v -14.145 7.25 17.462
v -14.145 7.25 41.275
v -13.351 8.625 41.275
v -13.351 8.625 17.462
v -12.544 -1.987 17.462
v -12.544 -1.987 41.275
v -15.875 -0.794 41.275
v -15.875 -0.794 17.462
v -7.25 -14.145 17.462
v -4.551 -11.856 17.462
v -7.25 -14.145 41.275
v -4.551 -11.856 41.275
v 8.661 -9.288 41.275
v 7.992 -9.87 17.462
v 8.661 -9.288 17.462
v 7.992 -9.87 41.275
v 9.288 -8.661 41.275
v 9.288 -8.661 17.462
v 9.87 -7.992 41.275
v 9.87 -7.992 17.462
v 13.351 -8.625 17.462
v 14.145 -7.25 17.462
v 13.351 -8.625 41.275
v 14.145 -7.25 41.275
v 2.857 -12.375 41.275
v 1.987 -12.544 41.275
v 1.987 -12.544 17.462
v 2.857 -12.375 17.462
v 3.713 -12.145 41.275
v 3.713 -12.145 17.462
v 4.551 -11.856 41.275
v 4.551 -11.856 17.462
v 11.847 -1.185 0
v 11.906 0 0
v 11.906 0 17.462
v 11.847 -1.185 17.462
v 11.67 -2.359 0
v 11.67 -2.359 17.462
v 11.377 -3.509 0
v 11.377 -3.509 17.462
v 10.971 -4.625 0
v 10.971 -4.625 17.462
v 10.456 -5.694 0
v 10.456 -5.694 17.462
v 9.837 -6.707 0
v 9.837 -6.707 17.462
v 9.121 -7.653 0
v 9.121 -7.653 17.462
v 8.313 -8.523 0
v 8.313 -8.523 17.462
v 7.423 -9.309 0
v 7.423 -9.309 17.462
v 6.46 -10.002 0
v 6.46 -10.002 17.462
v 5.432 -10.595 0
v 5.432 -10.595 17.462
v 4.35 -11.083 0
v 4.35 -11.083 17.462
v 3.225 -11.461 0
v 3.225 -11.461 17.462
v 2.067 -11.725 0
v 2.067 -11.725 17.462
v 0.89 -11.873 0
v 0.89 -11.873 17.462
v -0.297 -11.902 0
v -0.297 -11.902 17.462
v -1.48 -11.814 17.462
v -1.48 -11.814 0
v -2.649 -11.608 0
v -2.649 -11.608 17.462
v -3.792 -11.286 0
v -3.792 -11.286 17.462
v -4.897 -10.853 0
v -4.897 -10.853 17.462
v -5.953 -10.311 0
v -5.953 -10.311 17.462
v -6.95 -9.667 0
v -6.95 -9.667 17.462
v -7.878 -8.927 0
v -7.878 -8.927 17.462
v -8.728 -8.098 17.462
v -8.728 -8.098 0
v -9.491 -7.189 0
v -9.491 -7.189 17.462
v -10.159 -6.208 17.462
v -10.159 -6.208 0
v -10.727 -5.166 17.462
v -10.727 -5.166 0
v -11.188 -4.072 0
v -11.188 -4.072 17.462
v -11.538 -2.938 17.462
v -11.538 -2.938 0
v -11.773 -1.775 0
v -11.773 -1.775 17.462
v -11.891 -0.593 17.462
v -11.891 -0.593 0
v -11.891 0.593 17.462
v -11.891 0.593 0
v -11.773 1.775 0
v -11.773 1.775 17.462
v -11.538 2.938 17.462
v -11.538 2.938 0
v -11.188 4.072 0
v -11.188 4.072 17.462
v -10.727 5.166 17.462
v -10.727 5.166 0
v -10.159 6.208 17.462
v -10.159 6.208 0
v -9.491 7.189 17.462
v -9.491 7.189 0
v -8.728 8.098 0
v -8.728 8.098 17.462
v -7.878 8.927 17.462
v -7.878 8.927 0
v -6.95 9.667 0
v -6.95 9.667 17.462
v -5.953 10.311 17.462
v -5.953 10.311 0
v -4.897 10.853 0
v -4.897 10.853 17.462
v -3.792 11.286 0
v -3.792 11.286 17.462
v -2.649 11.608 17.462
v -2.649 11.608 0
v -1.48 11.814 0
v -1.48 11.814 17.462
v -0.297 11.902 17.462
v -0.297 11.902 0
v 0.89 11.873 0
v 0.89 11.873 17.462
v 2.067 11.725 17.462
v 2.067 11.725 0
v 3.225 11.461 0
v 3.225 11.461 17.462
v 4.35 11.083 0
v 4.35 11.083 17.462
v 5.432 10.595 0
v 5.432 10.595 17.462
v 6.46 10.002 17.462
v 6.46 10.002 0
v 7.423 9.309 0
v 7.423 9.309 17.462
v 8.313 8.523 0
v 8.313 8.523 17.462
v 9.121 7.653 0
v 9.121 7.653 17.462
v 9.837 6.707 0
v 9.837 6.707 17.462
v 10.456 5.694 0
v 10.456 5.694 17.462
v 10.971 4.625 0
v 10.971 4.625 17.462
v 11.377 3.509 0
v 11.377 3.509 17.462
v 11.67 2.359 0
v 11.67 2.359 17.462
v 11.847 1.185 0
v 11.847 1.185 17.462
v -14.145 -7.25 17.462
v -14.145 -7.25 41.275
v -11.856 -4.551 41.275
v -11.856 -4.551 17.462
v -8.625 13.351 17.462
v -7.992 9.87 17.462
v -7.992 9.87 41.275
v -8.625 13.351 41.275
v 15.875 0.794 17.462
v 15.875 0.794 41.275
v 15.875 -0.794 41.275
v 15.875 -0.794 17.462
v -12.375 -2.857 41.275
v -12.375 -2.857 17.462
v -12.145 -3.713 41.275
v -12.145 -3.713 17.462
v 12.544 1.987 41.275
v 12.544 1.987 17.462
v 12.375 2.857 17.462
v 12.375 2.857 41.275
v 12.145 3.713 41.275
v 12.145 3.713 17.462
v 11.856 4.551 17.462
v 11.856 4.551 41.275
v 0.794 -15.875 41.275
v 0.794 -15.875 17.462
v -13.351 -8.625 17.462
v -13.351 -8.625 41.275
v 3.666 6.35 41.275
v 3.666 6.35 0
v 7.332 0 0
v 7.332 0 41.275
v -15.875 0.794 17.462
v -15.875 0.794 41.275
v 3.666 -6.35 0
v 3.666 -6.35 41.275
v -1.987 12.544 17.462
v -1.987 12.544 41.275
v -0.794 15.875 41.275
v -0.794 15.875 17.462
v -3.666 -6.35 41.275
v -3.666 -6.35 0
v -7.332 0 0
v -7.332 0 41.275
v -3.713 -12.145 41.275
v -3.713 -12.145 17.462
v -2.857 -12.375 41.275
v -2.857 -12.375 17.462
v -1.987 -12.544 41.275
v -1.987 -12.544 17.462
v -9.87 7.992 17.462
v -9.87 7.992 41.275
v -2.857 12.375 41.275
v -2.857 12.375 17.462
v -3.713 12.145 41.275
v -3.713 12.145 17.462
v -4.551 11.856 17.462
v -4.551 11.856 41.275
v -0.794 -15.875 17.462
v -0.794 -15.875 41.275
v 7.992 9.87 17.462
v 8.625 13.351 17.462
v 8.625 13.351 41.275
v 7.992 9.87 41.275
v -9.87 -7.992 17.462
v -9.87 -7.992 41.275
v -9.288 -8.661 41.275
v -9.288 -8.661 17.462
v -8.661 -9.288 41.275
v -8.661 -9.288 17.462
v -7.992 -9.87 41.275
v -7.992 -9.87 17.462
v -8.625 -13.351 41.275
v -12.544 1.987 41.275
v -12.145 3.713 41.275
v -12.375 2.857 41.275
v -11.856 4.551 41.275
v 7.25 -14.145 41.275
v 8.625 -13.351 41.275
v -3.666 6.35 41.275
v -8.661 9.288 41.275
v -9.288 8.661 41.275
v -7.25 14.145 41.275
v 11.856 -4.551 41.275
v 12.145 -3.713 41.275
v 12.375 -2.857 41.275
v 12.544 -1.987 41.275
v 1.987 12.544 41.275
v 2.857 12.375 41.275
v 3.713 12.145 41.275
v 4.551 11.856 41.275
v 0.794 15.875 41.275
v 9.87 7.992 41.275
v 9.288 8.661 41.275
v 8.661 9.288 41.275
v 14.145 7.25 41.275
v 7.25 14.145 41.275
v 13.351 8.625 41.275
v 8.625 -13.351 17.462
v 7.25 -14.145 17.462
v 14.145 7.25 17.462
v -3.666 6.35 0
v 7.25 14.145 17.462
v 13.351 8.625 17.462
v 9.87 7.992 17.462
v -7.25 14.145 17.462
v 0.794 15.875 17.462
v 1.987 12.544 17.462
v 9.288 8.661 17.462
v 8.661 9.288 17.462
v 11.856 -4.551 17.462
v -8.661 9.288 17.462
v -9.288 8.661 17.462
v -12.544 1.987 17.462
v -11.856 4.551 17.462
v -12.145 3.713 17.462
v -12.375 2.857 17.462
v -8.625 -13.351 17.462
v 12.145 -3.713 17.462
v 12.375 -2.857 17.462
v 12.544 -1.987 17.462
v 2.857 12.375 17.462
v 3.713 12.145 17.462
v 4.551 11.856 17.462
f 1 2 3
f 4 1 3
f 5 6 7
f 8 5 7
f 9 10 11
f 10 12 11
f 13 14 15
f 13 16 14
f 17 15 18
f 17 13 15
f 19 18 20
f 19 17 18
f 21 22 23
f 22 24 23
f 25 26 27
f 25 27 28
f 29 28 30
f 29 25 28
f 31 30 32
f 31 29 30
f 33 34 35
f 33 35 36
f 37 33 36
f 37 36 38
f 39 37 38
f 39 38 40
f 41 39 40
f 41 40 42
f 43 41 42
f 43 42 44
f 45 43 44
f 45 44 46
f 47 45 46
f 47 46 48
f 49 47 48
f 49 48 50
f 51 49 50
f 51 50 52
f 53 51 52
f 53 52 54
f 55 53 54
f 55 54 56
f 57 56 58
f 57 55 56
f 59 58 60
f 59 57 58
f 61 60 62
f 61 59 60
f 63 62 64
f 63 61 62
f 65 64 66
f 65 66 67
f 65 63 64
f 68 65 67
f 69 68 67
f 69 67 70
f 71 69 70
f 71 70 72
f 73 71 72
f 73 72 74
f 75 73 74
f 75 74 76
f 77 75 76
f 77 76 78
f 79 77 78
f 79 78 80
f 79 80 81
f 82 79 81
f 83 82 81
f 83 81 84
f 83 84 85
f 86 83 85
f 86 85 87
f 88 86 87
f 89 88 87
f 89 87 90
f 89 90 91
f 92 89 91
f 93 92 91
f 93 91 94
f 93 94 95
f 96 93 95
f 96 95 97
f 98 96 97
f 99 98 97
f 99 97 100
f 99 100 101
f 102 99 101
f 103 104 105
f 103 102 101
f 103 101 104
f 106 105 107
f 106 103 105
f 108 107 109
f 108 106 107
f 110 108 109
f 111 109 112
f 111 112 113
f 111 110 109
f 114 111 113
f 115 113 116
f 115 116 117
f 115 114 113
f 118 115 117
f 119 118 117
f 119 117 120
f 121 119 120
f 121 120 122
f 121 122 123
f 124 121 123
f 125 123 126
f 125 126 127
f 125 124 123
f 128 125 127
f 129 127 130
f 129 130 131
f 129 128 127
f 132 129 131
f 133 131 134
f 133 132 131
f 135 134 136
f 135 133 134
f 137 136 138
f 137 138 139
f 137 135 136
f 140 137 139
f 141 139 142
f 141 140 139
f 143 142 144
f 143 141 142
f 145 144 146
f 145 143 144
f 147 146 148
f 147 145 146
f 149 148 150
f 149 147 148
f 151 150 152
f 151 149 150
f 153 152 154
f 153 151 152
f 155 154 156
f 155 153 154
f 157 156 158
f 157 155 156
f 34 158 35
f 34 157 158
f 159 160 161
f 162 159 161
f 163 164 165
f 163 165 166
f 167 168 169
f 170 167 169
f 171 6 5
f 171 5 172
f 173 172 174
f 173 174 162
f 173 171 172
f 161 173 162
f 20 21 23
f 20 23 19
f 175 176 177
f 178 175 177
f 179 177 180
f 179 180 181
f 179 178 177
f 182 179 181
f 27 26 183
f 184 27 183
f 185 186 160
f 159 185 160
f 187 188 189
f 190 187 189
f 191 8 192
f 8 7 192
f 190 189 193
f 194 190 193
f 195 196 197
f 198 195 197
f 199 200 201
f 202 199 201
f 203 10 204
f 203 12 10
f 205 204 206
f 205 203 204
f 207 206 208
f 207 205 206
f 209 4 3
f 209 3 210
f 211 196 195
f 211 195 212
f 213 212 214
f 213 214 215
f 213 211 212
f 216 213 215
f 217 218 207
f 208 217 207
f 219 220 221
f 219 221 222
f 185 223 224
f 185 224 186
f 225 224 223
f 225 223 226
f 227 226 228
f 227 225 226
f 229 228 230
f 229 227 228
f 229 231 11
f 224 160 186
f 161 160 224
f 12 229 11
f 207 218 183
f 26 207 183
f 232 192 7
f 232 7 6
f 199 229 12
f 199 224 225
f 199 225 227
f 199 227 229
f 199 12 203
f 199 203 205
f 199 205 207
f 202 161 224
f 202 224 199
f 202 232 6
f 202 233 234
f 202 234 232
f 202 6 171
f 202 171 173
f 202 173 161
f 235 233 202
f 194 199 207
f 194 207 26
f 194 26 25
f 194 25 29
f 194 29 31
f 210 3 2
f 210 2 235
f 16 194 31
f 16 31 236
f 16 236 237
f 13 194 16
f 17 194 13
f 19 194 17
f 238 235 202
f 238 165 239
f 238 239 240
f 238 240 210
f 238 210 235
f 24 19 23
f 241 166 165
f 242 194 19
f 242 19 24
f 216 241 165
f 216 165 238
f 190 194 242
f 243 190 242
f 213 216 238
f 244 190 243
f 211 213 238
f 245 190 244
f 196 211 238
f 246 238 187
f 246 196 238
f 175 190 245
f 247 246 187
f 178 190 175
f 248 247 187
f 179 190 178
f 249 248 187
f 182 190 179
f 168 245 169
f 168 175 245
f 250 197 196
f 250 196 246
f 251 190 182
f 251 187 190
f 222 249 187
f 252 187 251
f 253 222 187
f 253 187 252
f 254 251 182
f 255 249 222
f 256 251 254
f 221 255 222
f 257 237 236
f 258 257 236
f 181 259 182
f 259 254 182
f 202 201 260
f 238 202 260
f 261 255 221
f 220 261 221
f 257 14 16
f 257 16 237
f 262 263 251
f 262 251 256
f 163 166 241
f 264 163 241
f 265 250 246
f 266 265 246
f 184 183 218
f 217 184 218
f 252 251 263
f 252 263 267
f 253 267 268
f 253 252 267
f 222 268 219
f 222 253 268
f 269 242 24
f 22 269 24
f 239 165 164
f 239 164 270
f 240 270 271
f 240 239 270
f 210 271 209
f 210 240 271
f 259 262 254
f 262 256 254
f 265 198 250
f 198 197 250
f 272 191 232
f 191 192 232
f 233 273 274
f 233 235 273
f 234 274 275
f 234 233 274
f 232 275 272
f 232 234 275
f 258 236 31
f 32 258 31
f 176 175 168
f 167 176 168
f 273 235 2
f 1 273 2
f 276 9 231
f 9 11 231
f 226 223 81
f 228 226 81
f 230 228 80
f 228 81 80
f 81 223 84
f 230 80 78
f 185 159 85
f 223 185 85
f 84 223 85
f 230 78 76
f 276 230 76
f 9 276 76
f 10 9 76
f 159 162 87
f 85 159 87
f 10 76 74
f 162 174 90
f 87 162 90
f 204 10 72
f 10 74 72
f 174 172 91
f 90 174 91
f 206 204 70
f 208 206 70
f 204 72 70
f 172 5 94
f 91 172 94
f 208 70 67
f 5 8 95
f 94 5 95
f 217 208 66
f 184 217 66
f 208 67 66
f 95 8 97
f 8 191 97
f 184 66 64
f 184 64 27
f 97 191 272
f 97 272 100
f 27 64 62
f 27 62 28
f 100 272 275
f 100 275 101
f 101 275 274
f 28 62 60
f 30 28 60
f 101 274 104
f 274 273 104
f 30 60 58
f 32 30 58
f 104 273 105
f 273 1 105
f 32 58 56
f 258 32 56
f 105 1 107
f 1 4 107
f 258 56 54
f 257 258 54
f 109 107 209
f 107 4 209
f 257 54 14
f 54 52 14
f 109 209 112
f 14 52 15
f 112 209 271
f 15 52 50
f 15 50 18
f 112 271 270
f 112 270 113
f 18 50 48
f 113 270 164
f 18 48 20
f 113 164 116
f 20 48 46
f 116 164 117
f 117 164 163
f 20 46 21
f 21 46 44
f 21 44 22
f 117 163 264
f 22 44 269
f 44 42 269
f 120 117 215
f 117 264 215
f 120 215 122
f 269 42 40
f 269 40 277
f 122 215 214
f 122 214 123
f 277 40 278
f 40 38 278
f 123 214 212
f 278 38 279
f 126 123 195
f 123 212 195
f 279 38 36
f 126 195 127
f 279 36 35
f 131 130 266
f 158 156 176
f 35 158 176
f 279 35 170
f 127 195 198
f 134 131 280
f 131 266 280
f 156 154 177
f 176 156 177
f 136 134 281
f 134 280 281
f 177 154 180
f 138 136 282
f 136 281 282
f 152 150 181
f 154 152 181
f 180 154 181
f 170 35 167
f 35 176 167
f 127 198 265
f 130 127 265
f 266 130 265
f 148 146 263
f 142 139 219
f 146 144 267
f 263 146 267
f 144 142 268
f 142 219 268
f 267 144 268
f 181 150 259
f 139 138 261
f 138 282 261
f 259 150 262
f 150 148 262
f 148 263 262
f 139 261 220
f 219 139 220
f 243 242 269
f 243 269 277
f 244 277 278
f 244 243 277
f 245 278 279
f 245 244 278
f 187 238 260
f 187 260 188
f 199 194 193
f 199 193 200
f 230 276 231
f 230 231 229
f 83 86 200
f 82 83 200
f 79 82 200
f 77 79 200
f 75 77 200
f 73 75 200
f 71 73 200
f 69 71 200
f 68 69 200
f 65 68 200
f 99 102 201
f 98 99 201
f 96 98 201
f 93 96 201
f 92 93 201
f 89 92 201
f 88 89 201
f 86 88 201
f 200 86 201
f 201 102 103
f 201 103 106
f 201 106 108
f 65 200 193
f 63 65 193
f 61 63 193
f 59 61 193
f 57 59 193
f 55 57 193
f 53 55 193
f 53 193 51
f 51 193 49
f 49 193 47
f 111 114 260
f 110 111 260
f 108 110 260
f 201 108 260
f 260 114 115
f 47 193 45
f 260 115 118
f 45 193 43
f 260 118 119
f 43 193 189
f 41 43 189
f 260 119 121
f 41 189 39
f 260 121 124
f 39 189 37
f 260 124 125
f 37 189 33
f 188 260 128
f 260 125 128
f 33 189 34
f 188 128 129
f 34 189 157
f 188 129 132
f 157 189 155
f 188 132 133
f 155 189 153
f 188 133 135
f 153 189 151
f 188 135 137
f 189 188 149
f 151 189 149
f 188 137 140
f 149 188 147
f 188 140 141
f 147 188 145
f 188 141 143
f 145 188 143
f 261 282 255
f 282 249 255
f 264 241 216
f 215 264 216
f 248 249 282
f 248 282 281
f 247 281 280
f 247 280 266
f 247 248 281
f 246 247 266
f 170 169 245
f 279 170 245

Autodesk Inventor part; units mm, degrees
ref_plane "YZ Plane" through (0, 0, 0) normal (1, 0, 0) x (0, 1, 0)
ref_plane "XZ Plane" through (0, 0, 0) normal (0, 1, 0) x (-1, 0, 0)
ref_plane "XY Plane" through (0, 0, 0) normal (0, 0, 1) x (1, 0, 0)
sketch "Sketch1" plane through (0, 0, 0) normal (0, 0, 1) x (1, 0, 0)
  circle A0 centre (0, 0) radius 11.9062
  dimension "d0" = 23.8125
extrude "Extrusion1" add sketch "Sketch1" along normal blind 41.275
sketch "Sketch2" plane through (0, 0, 41.275) normal (0, 0, 1) x (1, 0, 0)
  circle A0 centre (0, 0) radius 12.7
  dimension "d3" = 25.4
extrude "Extrusion2" add sketch "Sketch2" against normal blind 23.8125
sketch "Sketch3" plane through (0, 0, 41.275) normal (0, 0, 1) x (1, 0, 0)
  line L0 (-3.6662, 6.35) -> (3.6662, 6.35)
  line L1 (3.6662, 6.35) -> (7.3323, 0)
  line L2 (7.3323, 0) -> (3.6662, -6.35)
  line L3 (3.6662, -6.35) -> (-3.6662, -6.35)
  line L4 (-3.6662, -6.35) -> (-7.3323, 0)
  line L5 (-7.3323, 0) -> (-3.6662, 6.35)
  point P0 (0, 0)
  dimension "d6" = 12.7
  dimension "d7" = 12.7
  dimension "d8" = 12.7
  dimension "d9" = 120
  dimension "d10" = 120
  dimension "d11" = 6.35
  dimension "d12" = 6.35
  dimension "d13" = 6.35
extrude "Extrusion3" cut sketch "Sketch3" against normal blind 50.8
sketch "Sketch4" plane through (0, 0, 41.275) normal (0, 0, 1) x (1, 0, 0)
  line L0 (-7.3323, 0) -> (-3.6662, 6.35) projected
  line L1 (-3.6662, 6.35) -> (3.6662, 6.35) projected
  line L2 (3.6662, 6.35) -> (7.3323, 0) projected
  line L3 (7.3323, 0) -> (3.6662, -6.35) projected
  line L4 (3.6662, -6.35) -> (-3.6662, -6.35) projected
  line L5 (-3.6662, -6.35) -> (-7.3323, 0) projected
  circle A0 centre (0, 0) radius 12.7 projected
  line L6 (0, 12.7) -> (0, 15.875) construction
  line L7 (0, 12.7) -> (3.175, 12.7) construction
  line L8 (0, 0) -> (1.9867, 12.5436) construction
  circle A1 centre (0, 0) radius 12.7 construction
  line L9 (0, 0) -> (12.7, 0) construction
  line L10 (0, 0) -> (-1.9867, 12.5436) construction
  line L11 (0, 0) -> (12.7, 0) construction
  line L12 (0, 15.875) -> (0.7937, 15.875) construction
  line L13 (0, 15.875) -> (0.7937, 15.875) construction
  line L14 (0, 15.875) -> (-0.7937, 15.875) construction
  line L15 (0, 15.875) -> (0.7937, 15.875) construction
  line L16 (-1.9867, 12.5436) -> (-0.7937, 15.875)
  line L17 (-0.7937, 15.875) -> (0.7937, 15.875)
  line L18 (0.7937, 15.875) -> (1.9867, 12.5436)
  line L19 (-1.9867, 12.5436) -> (1.9867, 12.5436)
  line L20 (-6.35, 10.9985) -> (-7.9375, 13.7482) construction
  line L21 (-6.35, 10.9985) -> (-3.6004, 12.586) construction
  line L22 (0, 0) -> (-4.5513, 11.8565) construction
  line L23 (0, 0) -> (-7.9924, 9.8698) construction
  line L24 (-7.9375, 13.7482) -> (-7.2501, 14.145) construction
  line L25 (-7.9375, 13.7482) -> (-7.2501, 14.145) construction
  line L26 (-7.9375, 13.7482) -> (-8.6249, 13.3513) construction
  line L27 (-7.9375, 13.7482) -> (-7.2501, 14.145) construction
  line L28 (-7.9924, 9.8698) -> (-8.6249, 13.3513)
  line L29 (-8.6249, 13.3513) -> (-7.2501, 14.145)
  line L30 (-7.2501, 14.145) -> (-4.5513, 11.8565)
  line L31 (-7.9924, 9.8698) -> (-4.5513, 11.8565)
  line L32 (-10.9985, 6.35) -> (-13.7482, 7.9375) construction
  line L33 (-10.9985, 6.35) -> (-9.411, 9.0996) construction
  line L34 (0, 0) -> (-9.8698, 7.9924) construction
  line L35 (0, 0) -> (-11.8565, 4.5513) construction
  line L36 (-13.7482, 7.9375) -> (-13.3513, 8.6249) construction
  line L37 (-13.7482, 7.9375) -> (-13.3513, 8.6249) construction
  line L38 (-13.7482, 7.9375) -> (-14.145, 7.2501) construction
  line L39 (-13.7482, 7.9375) -> (-13.3513, 8.6249) construction
  line L40 (-11.8565, 4.5513) -> (-14.145, 7.2501)
  line L41 (-14.145, 7.2501) -> (-13.3513, 8.6249)
  line L42 (-13.3513, 8.6249) -> (-9.8698, 7.9924)
  line L43 (-11.8565, 4.5513) -> (-9.8698, 7.9924)
  line L44 (-12.7, 0) -> (-15.875, 0) construction
  line L45 (-12.7, 0) -> (-12.7, 3.175) construction
  line L46 (0, 0) -> (-12.5436, 1.9867) construction
  line L47 (0, 0) -> (-12.5436, -1.9867) construction
  line L48 (-15.875, 0) -> (-15.875, 0.7938) construction
  line L49 (-15.875, 0) -> (-15.875, 0.7938) construction
  line L50 (-15.875, 0) -> (-15.875, -0.7937) construction
  line L51 (-15.875, 0) -> (-15.875, 0.7938) construction
  line L52 (-12.5436, -1.9867) -> (-15.875, -0.7937)
  line L53 (-15.875, -0.7937) -> (-15.875, 0.7938)
  line L54 (-15.875, 0.7938) -> (-12.5436, 1.9867)
  line L55 (-12.5436, -1.9867) -> (-12.5436, 1.9867)
  line L56 (-10.9985, -6.35) -> (-13.7482, -7.9375) construction
  line L57 (-10.9985, -6.35) -> (-12.586, -3.6004) construction
  line L58 (0, 0) -> (-11.8565, -4.5513) construction
  line L59 (0, 0) -> (-9.8698, -7.9924) construction
  line L60 (-13.7482, -7.9375) -> (-14.145, -7.2501) construction
  line L61 (-13.7482, -7.9375) -> (-14.145, -7.2501) construction
  line L62 (-13.7482, -7.9375) -> (-13.3513, -8.6249) construction
  line L63 (-13.7482, -7.9375) -> (-14.145, -7.2501) construction
  line L64 (-9.8698, -7.9924) -> (-13.3513, -8.6249)
  line L65 (-13.3513, -8.6249) -> (-14.145, -7.2501)
  line L66 (-14.145, -7.2501) -> (-11.8565, -4.5513)
  line L67 (-9.8698, -7.9924) -> (-11.8565, -4.5513)
  line L68 (-6.35, -10.9985) -> (-7.9375, -13.7482) construction
  line L69 (-6.35, -10.9985) -> (-9.0996, -9.411) construction
  line L70 (0, 0) -> (-7.9924, -9.8698) construction
  line L71 (0, 0) -> (-4.5513, -11.8565) construction
  line L72 (-7.9375, -13.7482) -> (-8.6249, -13.3513) construction
  line L73 (-7.9375, -13.7482) -> (-8.6249, -13.3513) construction
  line L74 (-7.9375, -13.7482) -> (-7.2501, -14.145) construction
  line L75 (-7.9375, -13.7482) -> (-8.6249, -13.3513) construction
  line L76 (-4.5513, -11.8565) -> (-7.2501, -14.145)
  line L77 (-7.2501, -14.145) -> (-8.6249, -13.3513)
  line L78 (-8.6249, -13.3513) -> (-7.9924, -9.8698)
  line L79 (-4.5513, -11.8565) -> (-7.9924, -9.8698)
  line L80 (0, -12.7) -> (0, -15.875) construction
  line L81 (0, -12.7) -> (-3.175, -12.7) construction
  line L82 (0, 0) -> (-1.9867, -12.5436) construction
  line L83 (0, 0) -> (1.9867, -12.5436) construction
  line L84 (0, -15.875) -> (-0.7938, -15.875) construction
  line L85 (0, -15.875) -> (-0.7938, -15.875) construction
  line L86 (0, -15.875) -> (0.7937, -15.875) construction
  line L87 (0, -15.875) -> (-0.7938, -15.875) construction
  line L88 (1.9867, -12.5436) -> (0.7937, -15.875)
  line L89 (0.7937, -15.875) -> (-0.7938, -15.875)
  line L90 (-0.7938, -15.875) -> (-1.9867, -12.5436)
  line L91 (1.9867, -12.5436) -> (-1.9867, -12.5436)
  line L92 (6.35, -10.9985) -> (7.9375, -13.7482) construction
  line L93 (6.35, -10.9985) -> (3.6004, -12.586) construction
  line L94 (0, 0) -> (4.5513, -11.8565) construction
  line L95 (0, 0) -> (7.9924, -9.8698) construction
  line L96 (7.9375, -13.7482) -> (7.2501, -14.145) construction
  line L97 (7.9375, -13.7482) -> (7.2501, -14.145) construction
  line L98 (7.9375, -13.7482) -> (8.6249, -13.3513) construction
  line L99 (7.9375, -13.7482) -> (7.2501, -14.145) construction
  line L100 (7.9924, -9.8698) -> (8.6249, -13.3513)
  line L101 (8.6249, -13.3513) -> (7.2501, -14.145)
  line L102 (7.2501, -14.145) -> (4.5513, -11.8565)
  line L103 (7.9924, -9.8698) -> (4.5513, -11.8565)
  line L104 (10.9985, -6.35) -> (13.7482, -7.9375) construction
  line L105 (10.9985, -6.35) -> (9.411, -9.0996) construction
  line L106 (0, 0) -> (9.8698, -7.9924) construction
  line L107 (0, 0) -> (11.8565, -4.5513) construction
  line L108 (13.7482, -7.9375) -> (13.3513, -8.6249) construction
  line L109 (13.7482, -7.9375) -> (13.3513, -8.6249) construction
  line L110 (13.7482, -7.9375) -> (14.145, -7.2501) construction
  line L111 (13.7482, -7.9375) -> (13.3513, -8.6249) construction
  line L112 (11.8565, -4.5513) -> (14.145, -7.2501)
  line L113 (14.145, -7.2501) -> (13.3513, -8.6249)
  line L114 (13.3513, -8.6249) -> (9.8698, -7.9924)
  line L115 (11.8565, -4.5513) -> (9.8698, -7.9924)
  line L116 (12.7, 0) -> (15.875, 0) construction
  line L117 (12.7, 0) -> (12.7, -3.175) construction
  line L118 (0, 0) -> (12.5436, -1.9867) construction
  line L119 (0, 0) -> (12.5436, 1.9867) construction
  line L120 (15.875, 0) -> (15.875, -0.7938) construction
  line L121 (15.875, 0) -> (15.875, -0.7938) construction
  line L122 (15.875, 0) -> (15.875, 0.7937) construction
  line L123 (15.875, 0) -> (15.875, -0.7938) construction
  line L124 (12.5436, 1.9867) -> (15.875, 0.7937)
  line L125 (15.875, 0.7937) -> (15.875, -0.7938)
  line L126 (15.875, -0.7938) -> (12.5436, -1.9867)
  line L127 (12.5436, 1.9867) -> (12.5436, -1.9867)
  line L128 (10.9985, 6.35) -> (13.7482, 7.9375) construction
  line L129 (10.9985, 6.35) -> (12.586, 3.6004) construction
  line L130 (0, 0) -> (11.8565, 4.5513) construction
  line L131 (0, 0) -> (9.8698, 7.9924) construction
  line L132 (13.7482, 7.9375) -> (14.145, 7.2501) construction
  line L133 (13.7482, 7.9375) -> (14.145, 7.2501) construction
  line L134 (13.7482, 7.9375) -> (13.3513, 8.6249) construction
  line L135 (13.7482, 7.9375) -> (14.145, 7.2501) construction
  line L136 (9.8698, 7.9924) -> (13.3513, 8.6249)
  line L137 (13.3513, 8.6249) -> (14.145, 7.2501)
  line L138 (14.145, 7.2501) -> (11.8565, 4.5513)
  line L139 (9.8698, 7.9924) -> (11.8565, 4.5513)
  line L140 (6.35, 10.9985) -> (7.9375, 13.7482) construction
  line L141 (6.35, 10.9985) -> (9.0996, 9.411) construction
  line L142 (0, 0) -> (7.9924, 9.8698) construction
  line L143 (0, 0) -> (4.5513, 11.8565) construction
  line L144 (7.9375, 13.7482) -> (8.6249, 13.3513) construction
  line L145 (7.9375, 13.7482) -> (8.6249, 13.3513) construction
  line L146 (7.9375, 13.7482) -> (7.2501, 14.145) construction
  line L147 (7.9375, 13.7482) -> (8.6249, 13.3513) construction
  line L148 (4.5513, 11.8565) -> (7.2501, 14.145)
  line L149 (7.2501, 14.145) -> (8.6249, 13.3513)
  line L150 (8.6249, 13.3513) -> (7.9924, 9.8698)
  line L151 (4.5513, 11.8565) -> (7.9924, 9.8698)
  dimension "d16" = 12.7
  dimension "d17" = 0
  dimension "d18" = 3.175
  dimension "d19" = 90
  dimension "d20" = 81
  dimension "d21" = 99
  dimension "d22" = 0.7937
  dimension "d23" = 0
  dimension "d24" = 0.7937
  dimension "d25" = 180
  dimension "d28" = 360
extrude "Extrusion4" add sketch "Sketch4" against normal blind 23.8125 contours A0 L127 | A0 L124 L125 L126 | L139 A0 | A0 L136 L137 L138 | L112 L113 L114 A0 | A0 L115 | L151 A0 | A0 L148 L149 L150 | L100 L101 L102 A0 | A0 L103 | L19 A0 | A0 L16 L17 L18 | L88 L89 L90 A0 | A0 L91 | L31 A0 | A0 L28 L29 L30 | L76 L77 L78 A0 | A0 L79 | L43 A0 | A0 L40 L41 L42 | L64 L65 L66 A0 | A0 L67 | L55 A0 | A0 L52 L53 L54
properties part number "pinion"
